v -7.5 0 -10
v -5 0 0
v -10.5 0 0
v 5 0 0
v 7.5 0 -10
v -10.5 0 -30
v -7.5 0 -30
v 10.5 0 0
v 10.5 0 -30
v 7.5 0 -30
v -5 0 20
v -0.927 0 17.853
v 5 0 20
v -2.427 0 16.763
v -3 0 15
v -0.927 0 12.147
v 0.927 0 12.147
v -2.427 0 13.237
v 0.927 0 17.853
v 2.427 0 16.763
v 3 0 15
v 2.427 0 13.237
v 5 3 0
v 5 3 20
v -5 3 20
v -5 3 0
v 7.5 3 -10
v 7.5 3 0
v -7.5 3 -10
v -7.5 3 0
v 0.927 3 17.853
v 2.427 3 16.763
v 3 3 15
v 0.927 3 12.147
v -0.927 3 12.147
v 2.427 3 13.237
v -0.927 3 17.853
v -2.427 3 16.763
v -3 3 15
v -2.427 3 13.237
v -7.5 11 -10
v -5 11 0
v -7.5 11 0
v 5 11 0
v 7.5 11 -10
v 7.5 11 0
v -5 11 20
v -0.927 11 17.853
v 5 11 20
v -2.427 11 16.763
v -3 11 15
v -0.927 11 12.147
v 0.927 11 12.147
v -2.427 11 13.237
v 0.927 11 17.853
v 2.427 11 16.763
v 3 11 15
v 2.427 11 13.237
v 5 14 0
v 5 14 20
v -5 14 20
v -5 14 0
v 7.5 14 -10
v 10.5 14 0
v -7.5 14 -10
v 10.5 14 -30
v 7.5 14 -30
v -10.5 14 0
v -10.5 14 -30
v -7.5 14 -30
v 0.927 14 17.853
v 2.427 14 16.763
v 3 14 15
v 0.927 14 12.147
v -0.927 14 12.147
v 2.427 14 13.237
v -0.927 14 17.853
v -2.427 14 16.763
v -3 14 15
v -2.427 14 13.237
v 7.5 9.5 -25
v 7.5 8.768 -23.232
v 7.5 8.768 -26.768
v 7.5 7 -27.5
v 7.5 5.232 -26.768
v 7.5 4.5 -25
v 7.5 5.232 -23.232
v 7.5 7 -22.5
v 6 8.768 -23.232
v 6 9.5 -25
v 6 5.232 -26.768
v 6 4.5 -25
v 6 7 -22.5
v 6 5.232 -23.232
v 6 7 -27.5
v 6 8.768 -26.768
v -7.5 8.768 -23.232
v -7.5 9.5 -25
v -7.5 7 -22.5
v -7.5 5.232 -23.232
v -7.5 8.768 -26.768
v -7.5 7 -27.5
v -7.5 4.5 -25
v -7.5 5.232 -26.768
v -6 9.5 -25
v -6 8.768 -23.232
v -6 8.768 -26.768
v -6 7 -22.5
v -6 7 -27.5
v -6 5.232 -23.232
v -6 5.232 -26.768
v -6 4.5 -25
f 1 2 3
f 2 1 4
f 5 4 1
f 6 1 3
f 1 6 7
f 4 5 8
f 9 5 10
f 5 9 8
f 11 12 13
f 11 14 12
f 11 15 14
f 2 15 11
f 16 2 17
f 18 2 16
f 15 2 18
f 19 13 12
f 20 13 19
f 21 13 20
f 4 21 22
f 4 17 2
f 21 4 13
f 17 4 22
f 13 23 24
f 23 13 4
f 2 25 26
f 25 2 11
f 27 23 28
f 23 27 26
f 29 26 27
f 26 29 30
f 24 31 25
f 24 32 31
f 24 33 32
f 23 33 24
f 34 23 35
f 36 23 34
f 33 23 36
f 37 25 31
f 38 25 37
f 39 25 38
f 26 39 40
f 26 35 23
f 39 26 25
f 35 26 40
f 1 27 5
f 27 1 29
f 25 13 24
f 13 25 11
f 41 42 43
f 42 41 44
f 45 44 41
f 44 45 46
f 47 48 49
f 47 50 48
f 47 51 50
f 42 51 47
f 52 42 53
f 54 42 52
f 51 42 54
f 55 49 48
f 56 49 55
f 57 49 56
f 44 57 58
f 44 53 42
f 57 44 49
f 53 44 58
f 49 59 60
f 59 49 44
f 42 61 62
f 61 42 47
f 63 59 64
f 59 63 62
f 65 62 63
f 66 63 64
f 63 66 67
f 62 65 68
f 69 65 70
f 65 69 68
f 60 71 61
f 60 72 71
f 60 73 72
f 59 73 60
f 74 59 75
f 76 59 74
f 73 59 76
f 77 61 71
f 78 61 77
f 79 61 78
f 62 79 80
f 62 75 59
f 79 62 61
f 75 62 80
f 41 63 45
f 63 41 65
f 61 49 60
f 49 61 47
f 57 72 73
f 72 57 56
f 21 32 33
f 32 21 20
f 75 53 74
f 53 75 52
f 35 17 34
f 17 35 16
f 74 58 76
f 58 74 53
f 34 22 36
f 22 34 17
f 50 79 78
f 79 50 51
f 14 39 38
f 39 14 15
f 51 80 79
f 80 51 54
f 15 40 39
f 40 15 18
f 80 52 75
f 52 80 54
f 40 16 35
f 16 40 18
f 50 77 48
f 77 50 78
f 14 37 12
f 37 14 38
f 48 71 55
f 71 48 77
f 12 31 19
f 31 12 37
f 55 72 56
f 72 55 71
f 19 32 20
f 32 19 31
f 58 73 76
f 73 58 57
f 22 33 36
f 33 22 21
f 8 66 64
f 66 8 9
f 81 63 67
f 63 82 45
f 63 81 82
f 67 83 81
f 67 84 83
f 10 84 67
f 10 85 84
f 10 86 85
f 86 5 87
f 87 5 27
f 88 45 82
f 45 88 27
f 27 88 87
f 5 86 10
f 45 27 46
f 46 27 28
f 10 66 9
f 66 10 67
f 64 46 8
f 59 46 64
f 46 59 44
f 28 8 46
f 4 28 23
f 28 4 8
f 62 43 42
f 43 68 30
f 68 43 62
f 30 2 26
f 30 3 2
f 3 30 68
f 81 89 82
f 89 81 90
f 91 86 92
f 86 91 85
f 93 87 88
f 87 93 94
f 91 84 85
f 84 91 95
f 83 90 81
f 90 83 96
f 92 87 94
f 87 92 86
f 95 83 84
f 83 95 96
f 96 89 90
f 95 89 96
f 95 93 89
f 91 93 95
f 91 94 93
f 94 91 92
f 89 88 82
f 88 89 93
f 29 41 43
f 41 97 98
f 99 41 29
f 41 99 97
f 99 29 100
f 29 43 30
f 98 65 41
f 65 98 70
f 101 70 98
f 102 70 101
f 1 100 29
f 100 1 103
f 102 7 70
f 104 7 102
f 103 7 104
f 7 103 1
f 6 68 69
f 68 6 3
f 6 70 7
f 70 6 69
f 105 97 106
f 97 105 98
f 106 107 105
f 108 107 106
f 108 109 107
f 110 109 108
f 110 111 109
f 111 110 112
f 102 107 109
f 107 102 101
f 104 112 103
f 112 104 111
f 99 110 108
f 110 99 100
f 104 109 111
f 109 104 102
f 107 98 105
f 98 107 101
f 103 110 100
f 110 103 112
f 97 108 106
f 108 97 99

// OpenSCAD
union() {
	rotate(a = -90, v = [1, 0, 0]) {
		union() {
			translate(v = [0, 0, 7]) {
				rotate(a = 90, v = [0, 1, 0]) {
					translate(v = [0, 0, -5]) {
						difference() {
							union() {
								translate(v = [4.0000000000, -20, 0]) {
									cube(size = [3, 30, 10]);
								}
								translate(v = [-7.0000000000, -20, 0]) {
									cube(size = [3, 30, 10]);
								}
							}
							translate(v = [0, -15, 5]) {
								rotate(a = 90, v = [0, 1, 0]) {
									cylinder(h = 16, r = 3, center = true);
								}
							}
						}
					}
				}
			}
			translate(v = [-8.0000000000, 0, 0]) {
				cube(size = [16.0000000000, 10, 3]);
			}
			translate(v = [-8.0000000000, 0, 11]) {
				cube(size = [16.0000000000, 10, 3]);
			}
			translate(v = [7.5000000000, 0, 0]) {
				cube(size = [3, 30, 14]);
				translate(v = [0, 25, 7]) {
					rotate(a = 90, v = [0, 1, 0]) {
						cylinder(h = 3, r = 2.5000000000, center = true);
					}
				}
			}
			translate(v = [-10.5000000000, 0, 0]) {
				cube(size = [3, 30, 14]);
				translate(v = [3, 25, 7]) {
					rotate(a = 90, v = [0, 1, 0]) {
						cylinder(h = 3, r = 2.5000000000, center = true);
					}
				}
			}
		}
	}
}
